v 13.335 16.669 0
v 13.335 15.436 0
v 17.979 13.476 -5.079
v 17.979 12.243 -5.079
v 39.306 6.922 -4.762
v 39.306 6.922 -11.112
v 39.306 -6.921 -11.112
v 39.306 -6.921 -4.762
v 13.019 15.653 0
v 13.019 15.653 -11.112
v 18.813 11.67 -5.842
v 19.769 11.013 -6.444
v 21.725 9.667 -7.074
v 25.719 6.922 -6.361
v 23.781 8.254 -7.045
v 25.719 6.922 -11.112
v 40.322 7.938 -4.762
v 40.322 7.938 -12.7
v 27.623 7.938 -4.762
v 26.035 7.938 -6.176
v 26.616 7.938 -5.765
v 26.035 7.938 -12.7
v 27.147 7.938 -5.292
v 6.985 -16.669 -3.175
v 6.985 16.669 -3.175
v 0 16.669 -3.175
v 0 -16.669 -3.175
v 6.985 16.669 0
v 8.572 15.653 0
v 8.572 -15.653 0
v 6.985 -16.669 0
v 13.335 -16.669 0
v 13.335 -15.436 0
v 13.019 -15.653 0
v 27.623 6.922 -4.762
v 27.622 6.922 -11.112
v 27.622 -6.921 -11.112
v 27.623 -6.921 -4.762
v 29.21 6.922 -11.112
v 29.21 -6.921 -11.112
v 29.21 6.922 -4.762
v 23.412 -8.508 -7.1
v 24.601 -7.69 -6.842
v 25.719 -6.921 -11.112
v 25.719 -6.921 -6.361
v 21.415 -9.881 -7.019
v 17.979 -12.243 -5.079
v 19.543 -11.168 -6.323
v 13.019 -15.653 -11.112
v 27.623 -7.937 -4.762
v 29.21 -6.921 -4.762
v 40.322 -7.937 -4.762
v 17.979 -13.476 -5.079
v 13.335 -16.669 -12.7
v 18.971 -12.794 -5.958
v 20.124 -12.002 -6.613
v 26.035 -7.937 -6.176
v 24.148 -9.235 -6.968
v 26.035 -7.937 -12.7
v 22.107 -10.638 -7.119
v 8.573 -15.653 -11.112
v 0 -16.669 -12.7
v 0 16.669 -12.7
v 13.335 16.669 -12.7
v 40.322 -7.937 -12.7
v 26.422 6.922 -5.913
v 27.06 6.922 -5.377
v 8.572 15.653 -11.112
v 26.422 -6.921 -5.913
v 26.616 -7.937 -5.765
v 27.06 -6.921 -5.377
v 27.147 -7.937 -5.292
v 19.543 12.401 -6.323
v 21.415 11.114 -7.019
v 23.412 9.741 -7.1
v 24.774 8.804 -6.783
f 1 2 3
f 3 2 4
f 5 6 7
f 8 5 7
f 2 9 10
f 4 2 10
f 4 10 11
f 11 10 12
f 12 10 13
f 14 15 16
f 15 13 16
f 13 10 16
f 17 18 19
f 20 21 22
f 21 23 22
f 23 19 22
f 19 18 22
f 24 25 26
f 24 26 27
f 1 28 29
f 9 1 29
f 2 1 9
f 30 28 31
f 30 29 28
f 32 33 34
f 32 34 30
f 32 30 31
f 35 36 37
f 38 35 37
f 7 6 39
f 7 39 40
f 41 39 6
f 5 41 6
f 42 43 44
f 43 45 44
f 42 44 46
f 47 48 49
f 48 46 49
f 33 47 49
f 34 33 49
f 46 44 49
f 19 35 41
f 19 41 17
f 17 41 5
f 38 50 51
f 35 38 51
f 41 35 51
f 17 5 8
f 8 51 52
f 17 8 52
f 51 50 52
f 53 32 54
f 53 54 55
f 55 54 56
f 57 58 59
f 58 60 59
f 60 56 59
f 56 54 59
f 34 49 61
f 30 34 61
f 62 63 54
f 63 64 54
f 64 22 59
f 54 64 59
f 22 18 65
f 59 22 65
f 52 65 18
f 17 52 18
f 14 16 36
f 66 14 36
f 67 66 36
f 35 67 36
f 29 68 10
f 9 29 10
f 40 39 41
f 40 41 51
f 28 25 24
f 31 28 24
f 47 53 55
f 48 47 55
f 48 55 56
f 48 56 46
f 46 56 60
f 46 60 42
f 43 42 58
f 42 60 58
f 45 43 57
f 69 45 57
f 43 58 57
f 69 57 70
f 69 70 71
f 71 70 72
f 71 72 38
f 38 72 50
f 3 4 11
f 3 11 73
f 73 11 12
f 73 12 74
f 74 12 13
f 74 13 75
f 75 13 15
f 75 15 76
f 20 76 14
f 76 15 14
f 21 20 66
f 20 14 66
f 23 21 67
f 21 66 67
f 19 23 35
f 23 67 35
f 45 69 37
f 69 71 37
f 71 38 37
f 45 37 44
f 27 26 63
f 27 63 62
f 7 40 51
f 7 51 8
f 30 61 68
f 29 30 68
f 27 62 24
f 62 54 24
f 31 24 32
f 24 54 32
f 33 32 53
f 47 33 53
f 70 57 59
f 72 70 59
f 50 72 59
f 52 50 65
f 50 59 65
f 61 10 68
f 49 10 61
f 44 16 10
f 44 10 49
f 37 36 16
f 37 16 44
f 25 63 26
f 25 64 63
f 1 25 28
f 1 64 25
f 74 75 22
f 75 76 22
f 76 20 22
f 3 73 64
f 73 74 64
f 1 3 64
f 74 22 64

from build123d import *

# Parameters (mm, degrees)
F0_W      = 13.843
F0_H      = 10.0965
F1_DEPTH  = 12.7
F3_DEPTH  = 1.5875
F5_DEPTH  = 33.3385
F6_W      = 33.3375
F6_H      = 9.525
F7_DEPTH  = 6.985
F9_ANGLE  = -90
F11_ANGLE = -90


with BuildPart() as f1:
    # F0 (on Front) → F1 (new body)
    with BuildSketch(Plane.XZ):
        Polygon((7.9375, 33.3375), (-7.9375, 33.3375), (-7.9375, 19.05), (-16.66875, 6.35), (-16.66875, 0), (16.66875, 0), (16.66875, 6.35), (7.9375, 19.05), align=None)
        Polygon((15.65275, 6.0344407596), (15.65275, 1.5875), (-15.65275, 1.5875), (-15.65275, 6.0344407596), (-6.9215, 18.7344407596), (-6.9215, 20.6375), (6.9215, 20.6375), (6.9215, 18.7344407596), align=None, mode=Mode.SUBTRACT)
        with Locations((0, 27.27325)):
            Rectangle(F0_W, F0_H, mode=Mode.SUBTRACT)
    extrude(amount=F1_DEPTH)

    # F2 (on Front) → F3 (join)
    with BuildSketch(Plane.XZ):
        Polygon((7.9375, 33.3375), (-7.9375, 33.3375), (-7.9375, 19.05), (-16.66875, 6.35), (-16.66875, 0), (16.66875, 0), (16.66875, 6.35), (7.9375, 19.05), align=None)
    extrude(amount=F3_DEPTH)

    # F4 (on face) → F5 (cut, through all)
    with BuildSketch(Plane.YZ.offset(16.66875)):
        with BuildLine():
            Line((-12.7, 33.3375), (-12.7, 6.35))
            Line((-12.7, 6.35), (-7.6210542824, 10.9944259619))
            ThreePointArc((-7.6210542824, 10.9944259619), (-5.559666336, 15.8888014069), (-7.9375, 20.6375))
            Line((-7.9375, 20.6375), (-7.9375, 33.3375))
            Line((-7.9375, 33.3375), (-12.7, 33.3375))
        make_face()
    extrude(amount=-F5_DEPTH, mode=Mode.SUBTRACT)

    # F6 (on face) → F7 (join)
    with BuildSketch(Plane(origin=(0, 0, 0), x_dir=(1, 0, 0), z_dir=(0, 0, -1))):
        with Locations((0, 4.7625)):
            Rectangle(F6_W, F6_H)
    extrude(amount=F7_DEPTH)


with BuildPart() as f1_1:
    # F9: moved
    add(f1.part.rotate(Axis((0, 0, -6.985), (1, 0, 0)), F9_ANGLE))


with BuildPart() as f1_2:
    # F11: moved
    add(f1_1.part.rotate(Axis((0, 0, -2.2225), (0, 0, 1)), F11_ANGLE))


with BuildPart() as f1_3:
    # F12: moved
    add(f1_2.part.moved(Location((0, 0, -5.715))))


solid = f1_3.part
